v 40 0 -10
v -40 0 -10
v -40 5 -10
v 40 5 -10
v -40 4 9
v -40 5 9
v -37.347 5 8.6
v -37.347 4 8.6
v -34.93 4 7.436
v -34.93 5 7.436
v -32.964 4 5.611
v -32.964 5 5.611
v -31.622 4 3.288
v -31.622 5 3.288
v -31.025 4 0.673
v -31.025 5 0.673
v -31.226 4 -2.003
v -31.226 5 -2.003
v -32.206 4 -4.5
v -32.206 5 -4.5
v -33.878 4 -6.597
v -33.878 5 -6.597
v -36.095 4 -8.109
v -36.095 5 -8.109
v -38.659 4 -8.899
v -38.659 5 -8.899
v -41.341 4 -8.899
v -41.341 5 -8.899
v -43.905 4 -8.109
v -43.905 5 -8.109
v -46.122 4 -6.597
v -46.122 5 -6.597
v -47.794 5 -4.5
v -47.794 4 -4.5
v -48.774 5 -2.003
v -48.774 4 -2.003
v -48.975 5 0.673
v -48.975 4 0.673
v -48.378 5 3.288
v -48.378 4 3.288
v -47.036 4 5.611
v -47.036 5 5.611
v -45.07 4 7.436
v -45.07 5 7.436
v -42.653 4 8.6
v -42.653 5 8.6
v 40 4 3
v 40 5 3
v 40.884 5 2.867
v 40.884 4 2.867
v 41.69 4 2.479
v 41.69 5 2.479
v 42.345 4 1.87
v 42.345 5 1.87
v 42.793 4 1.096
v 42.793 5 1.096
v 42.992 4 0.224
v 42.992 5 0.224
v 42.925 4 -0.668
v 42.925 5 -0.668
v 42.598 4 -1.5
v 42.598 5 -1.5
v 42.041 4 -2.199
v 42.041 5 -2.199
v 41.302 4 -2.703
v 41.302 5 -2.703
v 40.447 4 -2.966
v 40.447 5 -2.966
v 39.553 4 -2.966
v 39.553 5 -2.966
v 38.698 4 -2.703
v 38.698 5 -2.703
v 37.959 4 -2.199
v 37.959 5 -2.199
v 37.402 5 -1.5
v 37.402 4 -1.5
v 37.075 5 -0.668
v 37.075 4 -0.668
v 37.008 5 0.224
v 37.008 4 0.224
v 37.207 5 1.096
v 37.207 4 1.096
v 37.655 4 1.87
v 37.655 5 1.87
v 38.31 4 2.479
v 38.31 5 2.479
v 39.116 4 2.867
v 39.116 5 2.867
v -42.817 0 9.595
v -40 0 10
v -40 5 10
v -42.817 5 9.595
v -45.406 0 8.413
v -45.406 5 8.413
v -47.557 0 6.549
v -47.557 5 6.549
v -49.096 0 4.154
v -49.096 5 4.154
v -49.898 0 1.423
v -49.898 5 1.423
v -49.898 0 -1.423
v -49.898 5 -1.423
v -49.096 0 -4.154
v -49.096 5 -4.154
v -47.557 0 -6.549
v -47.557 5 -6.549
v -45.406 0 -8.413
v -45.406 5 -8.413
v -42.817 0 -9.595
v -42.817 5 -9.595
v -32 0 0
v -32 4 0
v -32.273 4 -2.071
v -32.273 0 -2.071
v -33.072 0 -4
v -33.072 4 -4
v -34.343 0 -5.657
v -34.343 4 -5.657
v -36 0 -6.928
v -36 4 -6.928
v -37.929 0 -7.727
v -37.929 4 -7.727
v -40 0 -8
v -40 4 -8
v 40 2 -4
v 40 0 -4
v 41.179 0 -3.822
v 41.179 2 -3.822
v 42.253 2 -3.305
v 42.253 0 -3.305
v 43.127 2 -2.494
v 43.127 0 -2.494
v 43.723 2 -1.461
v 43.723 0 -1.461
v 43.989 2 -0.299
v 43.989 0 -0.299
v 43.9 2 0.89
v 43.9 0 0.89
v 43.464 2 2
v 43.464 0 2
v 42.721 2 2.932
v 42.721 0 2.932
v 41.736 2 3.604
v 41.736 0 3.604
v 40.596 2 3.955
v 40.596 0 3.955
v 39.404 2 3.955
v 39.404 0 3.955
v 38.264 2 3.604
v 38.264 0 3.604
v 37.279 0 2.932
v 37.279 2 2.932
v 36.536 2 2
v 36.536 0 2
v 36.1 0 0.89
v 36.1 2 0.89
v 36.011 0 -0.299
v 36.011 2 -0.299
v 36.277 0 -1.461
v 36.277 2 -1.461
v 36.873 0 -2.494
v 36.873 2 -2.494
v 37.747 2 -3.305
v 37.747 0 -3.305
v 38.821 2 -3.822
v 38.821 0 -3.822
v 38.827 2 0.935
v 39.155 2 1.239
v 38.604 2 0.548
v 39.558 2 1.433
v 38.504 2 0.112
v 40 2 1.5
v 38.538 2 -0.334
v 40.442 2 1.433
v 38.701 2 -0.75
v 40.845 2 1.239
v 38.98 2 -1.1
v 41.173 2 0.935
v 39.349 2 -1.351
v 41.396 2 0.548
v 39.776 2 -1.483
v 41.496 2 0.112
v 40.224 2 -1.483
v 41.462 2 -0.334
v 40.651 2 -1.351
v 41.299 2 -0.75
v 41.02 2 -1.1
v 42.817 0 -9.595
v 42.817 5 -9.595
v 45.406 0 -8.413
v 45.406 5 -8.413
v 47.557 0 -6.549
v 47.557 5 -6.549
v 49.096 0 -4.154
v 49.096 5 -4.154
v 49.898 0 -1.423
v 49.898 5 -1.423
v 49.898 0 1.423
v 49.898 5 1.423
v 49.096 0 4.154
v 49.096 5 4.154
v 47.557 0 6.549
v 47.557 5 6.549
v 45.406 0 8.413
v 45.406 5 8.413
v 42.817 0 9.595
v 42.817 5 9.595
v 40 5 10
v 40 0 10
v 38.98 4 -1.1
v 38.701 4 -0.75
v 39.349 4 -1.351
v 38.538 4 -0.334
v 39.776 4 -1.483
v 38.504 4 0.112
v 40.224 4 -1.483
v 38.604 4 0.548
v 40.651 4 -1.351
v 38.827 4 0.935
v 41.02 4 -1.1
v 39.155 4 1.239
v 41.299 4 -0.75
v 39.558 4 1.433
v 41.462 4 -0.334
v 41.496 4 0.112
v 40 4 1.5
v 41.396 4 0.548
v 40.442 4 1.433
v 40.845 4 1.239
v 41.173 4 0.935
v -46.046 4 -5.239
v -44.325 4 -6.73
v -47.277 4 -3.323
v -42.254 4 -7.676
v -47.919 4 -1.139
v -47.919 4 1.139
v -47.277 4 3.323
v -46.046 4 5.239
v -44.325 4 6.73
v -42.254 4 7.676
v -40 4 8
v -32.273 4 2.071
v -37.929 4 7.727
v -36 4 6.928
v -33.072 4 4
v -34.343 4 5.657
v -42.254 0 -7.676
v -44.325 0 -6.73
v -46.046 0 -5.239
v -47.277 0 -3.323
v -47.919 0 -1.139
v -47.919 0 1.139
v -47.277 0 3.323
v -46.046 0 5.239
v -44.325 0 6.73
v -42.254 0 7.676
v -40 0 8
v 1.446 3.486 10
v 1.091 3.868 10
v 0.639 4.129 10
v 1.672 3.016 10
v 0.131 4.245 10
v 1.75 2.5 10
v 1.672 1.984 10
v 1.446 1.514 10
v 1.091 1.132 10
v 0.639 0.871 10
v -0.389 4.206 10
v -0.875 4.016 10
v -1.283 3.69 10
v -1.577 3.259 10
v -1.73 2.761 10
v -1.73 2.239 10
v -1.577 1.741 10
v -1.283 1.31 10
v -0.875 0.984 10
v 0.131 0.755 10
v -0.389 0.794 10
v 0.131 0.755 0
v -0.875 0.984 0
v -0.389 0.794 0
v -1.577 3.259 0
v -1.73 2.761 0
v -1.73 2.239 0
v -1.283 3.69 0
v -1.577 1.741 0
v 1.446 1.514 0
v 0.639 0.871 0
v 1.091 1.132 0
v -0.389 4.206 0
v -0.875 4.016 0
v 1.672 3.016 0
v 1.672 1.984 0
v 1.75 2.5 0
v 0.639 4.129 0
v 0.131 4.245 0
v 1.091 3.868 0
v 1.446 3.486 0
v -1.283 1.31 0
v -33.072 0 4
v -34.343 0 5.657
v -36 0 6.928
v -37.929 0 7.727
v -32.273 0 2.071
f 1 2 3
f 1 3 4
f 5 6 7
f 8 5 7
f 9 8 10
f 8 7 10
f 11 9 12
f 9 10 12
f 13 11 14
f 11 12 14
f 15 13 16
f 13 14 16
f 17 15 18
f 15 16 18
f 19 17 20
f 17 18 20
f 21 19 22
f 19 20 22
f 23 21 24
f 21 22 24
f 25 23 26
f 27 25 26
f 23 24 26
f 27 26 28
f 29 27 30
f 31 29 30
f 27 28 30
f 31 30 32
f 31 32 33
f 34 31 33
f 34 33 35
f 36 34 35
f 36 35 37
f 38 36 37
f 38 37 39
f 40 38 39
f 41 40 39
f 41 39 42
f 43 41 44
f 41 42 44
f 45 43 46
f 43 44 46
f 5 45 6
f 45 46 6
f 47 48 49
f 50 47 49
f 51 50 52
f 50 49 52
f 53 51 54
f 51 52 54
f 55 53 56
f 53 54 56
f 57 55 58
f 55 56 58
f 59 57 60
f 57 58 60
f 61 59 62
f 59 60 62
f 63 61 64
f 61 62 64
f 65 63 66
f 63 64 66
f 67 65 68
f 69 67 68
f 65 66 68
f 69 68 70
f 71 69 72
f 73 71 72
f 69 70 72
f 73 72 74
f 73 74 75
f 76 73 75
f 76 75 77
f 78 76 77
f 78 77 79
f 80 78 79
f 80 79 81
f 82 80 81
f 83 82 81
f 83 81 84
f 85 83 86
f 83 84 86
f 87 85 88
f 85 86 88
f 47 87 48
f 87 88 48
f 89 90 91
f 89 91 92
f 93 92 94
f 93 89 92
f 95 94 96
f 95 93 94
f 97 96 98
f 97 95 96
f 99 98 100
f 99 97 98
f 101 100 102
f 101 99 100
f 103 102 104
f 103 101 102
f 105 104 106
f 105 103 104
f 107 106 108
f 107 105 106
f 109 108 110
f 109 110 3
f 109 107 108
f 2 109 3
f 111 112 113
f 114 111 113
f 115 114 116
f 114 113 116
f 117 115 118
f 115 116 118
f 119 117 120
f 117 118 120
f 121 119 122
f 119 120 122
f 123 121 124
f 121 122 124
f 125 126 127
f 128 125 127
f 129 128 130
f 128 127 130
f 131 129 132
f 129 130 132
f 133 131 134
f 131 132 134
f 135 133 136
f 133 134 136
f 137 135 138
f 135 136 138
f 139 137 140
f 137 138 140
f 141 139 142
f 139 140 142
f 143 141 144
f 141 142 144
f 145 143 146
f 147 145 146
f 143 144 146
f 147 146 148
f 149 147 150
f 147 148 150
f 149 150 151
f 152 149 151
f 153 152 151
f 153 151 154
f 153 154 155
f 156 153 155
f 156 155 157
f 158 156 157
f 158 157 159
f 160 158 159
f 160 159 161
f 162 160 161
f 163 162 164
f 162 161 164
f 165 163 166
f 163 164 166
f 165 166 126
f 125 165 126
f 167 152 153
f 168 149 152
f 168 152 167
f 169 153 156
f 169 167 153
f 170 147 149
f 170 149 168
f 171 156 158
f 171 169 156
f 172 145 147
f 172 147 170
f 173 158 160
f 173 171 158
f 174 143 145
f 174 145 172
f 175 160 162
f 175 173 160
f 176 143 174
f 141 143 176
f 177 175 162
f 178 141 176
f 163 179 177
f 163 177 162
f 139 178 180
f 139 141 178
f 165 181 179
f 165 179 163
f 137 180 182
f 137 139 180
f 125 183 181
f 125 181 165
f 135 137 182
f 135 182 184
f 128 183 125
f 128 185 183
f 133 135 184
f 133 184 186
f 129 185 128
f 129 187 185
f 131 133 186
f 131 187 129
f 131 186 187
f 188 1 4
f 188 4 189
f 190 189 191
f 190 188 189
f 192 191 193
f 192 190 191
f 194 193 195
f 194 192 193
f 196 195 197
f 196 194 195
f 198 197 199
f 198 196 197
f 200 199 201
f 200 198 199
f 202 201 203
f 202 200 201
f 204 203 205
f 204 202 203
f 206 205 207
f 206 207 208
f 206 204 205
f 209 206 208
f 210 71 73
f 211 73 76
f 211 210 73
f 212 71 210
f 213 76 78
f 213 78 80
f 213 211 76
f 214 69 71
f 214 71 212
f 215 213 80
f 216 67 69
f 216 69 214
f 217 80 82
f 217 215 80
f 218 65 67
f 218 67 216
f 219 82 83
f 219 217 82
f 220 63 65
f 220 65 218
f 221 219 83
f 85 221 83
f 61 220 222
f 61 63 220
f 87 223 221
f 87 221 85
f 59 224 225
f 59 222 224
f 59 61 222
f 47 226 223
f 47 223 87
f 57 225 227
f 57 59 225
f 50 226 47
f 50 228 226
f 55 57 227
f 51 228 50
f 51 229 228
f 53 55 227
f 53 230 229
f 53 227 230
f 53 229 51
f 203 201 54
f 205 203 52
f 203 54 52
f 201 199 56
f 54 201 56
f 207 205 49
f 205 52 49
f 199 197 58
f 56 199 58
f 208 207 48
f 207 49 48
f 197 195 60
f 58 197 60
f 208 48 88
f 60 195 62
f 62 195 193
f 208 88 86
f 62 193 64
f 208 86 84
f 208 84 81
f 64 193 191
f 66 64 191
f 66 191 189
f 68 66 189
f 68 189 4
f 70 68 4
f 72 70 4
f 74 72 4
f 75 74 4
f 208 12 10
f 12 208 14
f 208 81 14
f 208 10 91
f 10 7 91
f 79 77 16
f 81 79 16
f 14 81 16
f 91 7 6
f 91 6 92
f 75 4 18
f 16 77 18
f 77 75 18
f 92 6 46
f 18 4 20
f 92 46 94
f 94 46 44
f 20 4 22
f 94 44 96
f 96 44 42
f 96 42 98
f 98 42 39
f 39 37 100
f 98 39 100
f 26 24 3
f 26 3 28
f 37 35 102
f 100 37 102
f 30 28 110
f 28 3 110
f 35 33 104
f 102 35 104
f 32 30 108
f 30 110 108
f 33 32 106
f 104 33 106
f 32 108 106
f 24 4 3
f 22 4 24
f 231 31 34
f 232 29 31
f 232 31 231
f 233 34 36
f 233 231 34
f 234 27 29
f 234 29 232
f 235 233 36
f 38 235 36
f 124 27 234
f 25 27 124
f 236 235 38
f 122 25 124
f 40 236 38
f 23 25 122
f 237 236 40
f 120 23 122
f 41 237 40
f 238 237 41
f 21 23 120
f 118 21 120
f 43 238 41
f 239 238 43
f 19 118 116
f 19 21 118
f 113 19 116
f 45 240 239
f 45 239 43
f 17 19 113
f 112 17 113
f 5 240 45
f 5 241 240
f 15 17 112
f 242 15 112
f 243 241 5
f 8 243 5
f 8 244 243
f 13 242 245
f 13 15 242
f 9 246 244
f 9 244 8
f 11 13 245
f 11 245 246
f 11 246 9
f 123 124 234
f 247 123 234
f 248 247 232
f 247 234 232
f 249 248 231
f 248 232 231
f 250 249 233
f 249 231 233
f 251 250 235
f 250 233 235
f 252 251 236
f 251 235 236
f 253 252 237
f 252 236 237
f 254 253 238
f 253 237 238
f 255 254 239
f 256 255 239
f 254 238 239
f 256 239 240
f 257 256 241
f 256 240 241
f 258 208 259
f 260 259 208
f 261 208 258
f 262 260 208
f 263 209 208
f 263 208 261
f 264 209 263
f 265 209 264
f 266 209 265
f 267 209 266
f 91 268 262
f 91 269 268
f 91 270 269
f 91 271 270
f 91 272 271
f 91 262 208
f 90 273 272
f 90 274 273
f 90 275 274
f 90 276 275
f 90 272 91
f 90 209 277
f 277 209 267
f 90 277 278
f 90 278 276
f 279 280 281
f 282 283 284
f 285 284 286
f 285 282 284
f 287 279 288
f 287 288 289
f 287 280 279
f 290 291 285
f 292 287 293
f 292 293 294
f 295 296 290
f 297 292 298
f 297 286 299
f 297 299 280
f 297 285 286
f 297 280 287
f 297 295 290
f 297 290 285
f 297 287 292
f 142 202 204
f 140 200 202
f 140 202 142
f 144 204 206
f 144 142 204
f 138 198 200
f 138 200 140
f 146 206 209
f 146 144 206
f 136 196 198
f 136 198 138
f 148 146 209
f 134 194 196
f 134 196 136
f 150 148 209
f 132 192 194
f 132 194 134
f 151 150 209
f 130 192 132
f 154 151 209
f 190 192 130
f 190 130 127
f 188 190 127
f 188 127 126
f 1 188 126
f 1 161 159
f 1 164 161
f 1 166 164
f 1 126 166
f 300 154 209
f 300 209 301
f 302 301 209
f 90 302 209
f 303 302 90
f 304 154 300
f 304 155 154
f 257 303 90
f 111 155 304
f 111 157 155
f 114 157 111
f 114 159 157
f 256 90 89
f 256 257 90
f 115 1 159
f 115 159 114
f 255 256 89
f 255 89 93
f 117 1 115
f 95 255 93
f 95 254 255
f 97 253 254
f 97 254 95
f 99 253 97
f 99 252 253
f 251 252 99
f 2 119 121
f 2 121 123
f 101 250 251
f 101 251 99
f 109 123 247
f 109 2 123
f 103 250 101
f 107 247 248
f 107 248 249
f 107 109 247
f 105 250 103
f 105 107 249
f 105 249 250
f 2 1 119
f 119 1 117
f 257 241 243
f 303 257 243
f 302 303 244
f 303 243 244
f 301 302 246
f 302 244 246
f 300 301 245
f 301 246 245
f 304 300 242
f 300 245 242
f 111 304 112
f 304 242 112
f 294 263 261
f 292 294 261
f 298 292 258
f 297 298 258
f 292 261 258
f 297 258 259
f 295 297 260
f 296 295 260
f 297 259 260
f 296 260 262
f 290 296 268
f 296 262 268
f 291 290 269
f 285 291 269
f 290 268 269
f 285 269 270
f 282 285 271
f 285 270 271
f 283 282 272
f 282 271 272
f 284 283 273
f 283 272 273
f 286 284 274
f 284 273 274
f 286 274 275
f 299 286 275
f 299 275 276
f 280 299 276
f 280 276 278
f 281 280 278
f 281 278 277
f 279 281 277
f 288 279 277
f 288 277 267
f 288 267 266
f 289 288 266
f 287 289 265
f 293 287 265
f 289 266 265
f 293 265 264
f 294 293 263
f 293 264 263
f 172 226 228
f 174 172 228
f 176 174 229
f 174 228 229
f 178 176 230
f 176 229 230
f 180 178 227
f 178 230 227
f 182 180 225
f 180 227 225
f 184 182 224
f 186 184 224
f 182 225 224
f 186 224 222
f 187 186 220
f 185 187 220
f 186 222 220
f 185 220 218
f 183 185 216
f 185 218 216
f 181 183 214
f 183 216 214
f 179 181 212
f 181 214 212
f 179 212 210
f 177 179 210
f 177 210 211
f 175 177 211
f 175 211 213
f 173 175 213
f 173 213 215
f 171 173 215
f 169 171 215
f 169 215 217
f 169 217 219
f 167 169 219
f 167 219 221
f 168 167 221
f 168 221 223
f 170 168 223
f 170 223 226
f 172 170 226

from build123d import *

# Parameters (mm, degrees)
BOSS_EXTRUDE1_DEPTH = 5
CUT_EXTRUDE1_DEPTH  = 52.23475383
SKETCH3_R           = 9
CUT_EXTRUDE2_DEPTH  = 1
SKETCH4_R           = 3
CUT_EXTRUDE3_DEPTH  = 1
SKETCH5_R           = 1.5
CUT_EXTRUDE4_DEPTH  = 52.14684741
SKETCH6_R           = 4
CUT_EXTRUDE5_DEPTH  = 2
SKETCH8_R           = 1.75
CUT_EXTRUDE7_DEPTH  = 10


with BuildPart() as part:
    # Sketch1 → Boss-Extrude1 (new body)
    with BuildSketch(Plane(origin=(0, 0, 0), x_dir=(1, 0, 0), z_dir=(0, 1, 0))):
        with BuildLine():
            Line((-40, 10), (40, 10))
            ThreePointArc((40, 10), (50, 0), (40, -10))
            Line((40, -10), (-40, -10))
            ThreePointArc((-40, -10), (-50, 0), (-40, 10))
        make_face()
    extrude(amount=BOSS_EXTRUDE1_DEPTH)

    # Sketch2 → Cut-Extrude1 (cut, through all)
    with BuildSketch(Plane(origin=(0, 5, 0), x_dir=(1, 0, 0), z_dir=(0, 1, 0))):
        with BuildLine():
            ThreePointArc((-32, 0), (-34.343145751, 5.656854249), (-40, 8))
            Line((-40, 8), (-40, -8))
            ThreePointArc((-40, -8), (-34.343145751, -5.656854249), (-32, 0))
        make_face()
        with BuildLine():
            Line((-40, -8), (-40, 8))
            ThreePointArc((-40, 8), (-48, 0), (-40, -8))
        make_face()
    extrude(amount=-CUT_EXTRUDE1_DEPTH, mode=Mode.SUBTRACT)

    # Sketch3 → Cut-Extrude2 (cut)
    with BuildSketch(Plane(origin=(0, 5, 0), x_dir=(1, 0, 0), z_dir=(0, 1, 0))):
        with Locations(Location((-40, 0, 0), (0, 0, 270))):
            Circle(SKETCH3_R)
    extrude(amount=-CUT_EXTRUDE2_DEPTH, mode=Mode.SUBTRACT)

    # Sketch4 → Cut-Extrude3 (cut)
    with BuildSketch(Plane(origin=(0, 5, 0), x_dir=(1, 0, 0), z_dir=(0, 1, 0))):
        with Locations(Location((40, 0, 0), (0, 0, 270))):
            Circle(SKETCH4_R)
    extrude(amount=-CUT_EXTRUDE3_DEPTH, mode=Mode.SUBTRACT)

    # Sketch5 → Cut-Extrude4 (cut, through all)
    with BuildSketch(Plane(origin=(0, 4, 0), x_dir=(1, 0, 0), z_dir=(0, 1, 0))):
        with Locations(Location((40, 0, 0), (0, 0, 270))):
            Circle(SKETCH5_R)
    extrude(amount=-CUT_EXTRUDE4_DEPTH, mode=Mode.SUBTRACT)

    # Sketch6 → Cut-Extrude5 (cut)
    with BuildSketch(Plane.XZ):
        with Locations(Location((40, 0, 0), (0, 0, 270))):
            Circle(SKETCH6_R)
    extrude(amount=-CUT_EXTRUDE5_DEPTH, mode=Mode.SUBTRACT)

    # Sketch8 → Cut-Extrude7 (cut)
    with BuildSketch(Plane.XY.offset(10)):
        with Locations((0, 2.5)):
            Circle(SKETCH8_R)
    extrude(amount=-CUT_EXTRUDE7_DEPTH, mode=Mode.SUBTRACT)


solid = part.part
